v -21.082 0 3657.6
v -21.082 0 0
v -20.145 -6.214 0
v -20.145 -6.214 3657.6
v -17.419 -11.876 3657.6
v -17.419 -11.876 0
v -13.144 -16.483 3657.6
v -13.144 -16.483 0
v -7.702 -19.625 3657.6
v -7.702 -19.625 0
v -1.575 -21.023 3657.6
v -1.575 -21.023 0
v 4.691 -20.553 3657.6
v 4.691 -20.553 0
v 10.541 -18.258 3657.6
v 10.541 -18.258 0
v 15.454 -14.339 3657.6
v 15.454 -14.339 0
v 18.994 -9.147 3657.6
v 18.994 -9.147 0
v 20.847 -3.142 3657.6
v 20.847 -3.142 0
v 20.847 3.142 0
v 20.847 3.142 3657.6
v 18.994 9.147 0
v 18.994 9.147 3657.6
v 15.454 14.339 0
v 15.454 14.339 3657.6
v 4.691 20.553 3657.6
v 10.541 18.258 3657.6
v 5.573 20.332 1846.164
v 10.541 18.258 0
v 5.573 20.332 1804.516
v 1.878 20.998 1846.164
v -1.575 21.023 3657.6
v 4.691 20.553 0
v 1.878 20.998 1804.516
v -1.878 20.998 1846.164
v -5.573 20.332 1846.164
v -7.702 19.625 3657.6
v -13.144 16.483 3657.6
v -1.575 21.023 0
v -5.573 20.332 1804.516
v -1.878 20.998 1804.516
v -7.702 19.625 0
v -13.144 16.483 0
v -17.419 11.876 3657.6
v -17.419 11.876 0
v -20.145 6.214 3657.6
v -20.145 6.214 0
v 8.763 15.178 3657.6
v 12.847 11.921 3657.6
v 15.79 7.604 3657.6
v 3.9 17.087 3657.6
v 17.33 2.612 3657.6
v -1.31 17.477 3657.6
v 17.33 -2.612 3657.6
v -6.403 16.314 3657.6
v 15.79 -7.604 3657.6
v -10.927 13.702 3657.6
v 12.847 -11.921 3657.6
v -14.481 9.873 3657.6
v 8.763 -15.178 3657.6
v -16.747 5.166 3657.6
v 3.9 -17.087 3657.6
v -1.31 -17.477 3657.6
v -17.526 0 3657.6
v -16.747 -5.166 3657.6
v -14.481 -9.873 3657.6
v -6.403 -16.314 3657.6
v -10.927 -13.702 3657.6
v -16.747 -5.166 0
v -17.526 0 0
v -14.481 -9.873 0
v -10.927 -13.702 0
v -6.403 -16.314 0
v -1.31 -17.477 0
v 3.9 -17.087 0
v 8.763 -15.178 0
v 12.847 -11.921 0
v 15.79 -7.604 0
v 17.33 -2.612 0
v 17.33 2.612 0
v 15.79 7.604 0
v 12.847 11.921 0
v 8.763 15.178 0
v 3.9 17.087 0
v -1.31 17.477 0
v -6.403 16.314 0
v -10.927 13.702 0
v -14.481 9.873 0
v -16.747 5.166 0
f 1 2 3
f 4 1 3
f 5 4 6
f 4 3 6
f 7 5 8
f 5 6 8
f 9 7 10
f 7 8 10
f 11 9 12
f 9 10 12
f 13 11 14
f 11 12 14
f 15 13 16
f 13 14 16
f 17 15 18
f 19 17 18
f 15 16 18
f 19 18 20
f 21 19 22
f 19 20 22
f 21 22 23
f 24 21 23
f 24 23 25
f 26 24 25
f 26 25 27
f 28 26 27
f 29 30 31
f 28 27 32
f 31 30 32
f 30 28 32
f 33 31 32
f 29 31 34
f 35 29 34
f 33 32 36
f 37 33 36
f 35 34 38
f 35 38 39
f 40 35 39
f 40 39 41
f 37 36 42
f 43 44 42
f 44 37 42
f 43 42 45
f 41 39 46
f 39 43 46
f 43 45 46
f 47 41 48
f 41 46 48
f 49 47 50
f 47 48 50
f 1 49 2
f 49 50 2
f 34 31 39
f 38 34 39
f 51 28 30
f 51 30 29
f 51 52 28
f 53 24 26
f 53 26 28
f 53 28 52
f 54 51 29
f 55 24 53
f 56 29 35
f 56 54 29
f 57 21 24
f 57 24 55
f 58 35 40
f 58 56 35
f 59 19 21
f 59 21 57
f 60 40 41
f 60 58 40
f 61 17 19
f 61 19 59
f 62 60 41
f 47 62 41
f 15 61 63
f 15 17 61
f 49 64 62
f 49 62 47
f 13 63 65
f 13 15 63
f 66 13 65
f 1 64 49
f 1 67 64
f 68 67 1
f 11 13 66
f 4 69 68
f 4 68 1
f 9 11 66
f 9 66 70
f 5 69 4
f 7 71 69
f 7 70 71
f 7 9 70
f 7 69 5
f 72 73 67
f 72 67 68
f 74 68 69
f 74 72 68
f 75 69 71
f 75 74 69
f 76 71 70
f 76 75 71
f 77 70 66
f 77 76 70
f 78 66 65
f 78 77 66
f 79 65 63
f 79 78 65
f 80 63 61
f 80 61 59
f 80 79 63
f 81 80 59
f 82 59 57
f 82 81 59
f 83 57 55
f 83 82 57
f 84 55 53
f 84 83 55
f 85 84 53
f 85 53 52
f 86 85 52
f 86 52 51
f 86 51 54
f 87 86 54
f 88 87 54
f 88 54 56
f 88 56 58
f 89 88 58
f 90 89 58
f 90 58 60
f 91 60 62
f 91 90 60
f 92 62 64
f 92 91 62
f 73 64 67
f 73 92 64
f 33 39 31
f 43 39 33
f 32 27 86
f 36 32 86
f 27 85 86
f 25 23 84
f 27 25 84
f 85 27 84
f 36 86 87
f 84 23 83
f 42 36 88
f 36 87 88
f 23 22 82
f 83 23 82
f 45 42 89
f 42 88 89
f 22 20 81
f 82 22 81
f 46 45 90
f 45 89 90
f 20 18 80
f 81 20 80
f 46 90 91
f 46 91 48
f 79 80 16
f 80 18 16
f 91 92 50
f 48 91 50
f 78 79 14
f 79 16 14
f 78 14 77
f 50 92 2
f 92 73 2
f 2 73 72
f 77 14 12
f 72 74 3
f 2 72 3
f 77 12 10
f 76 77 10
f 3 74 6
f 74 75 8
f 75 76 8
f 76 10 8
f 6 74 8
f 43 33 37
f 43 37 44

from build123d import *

# Parameters (mm, degrees)
SKETCH1_R               = 21.082
SKETCH1_R_2             = 17.526
BOSS_EXTRUDE1_DEPTH     = 3657.6
CUT_EXTRUDE1_DEPTH      = 3658.721512287
CUT_EXTRUDE1_DEPTH_BACK = 3658.721512287
SKETCH4_W               = 41.647807864
SKETCH4_H               = 5.7730783


with BuildPart() as part:
    # Sketch1 → Boss-Extrude1 (new body)
    with BuildSketch(Plane.XY):
        with Locations(Location((0, 0, 0), (0, 0, 180))):
            Circle(SKETCH1_R)
        with Locations(Location((0, 0, 0), (0, 0, 180))):
            Circle(SKETCH1_R_2, mode=Mode.SUBTRACT)
    extrude(amount=BOSS_EXTRUDE1_DEPTH)

    # Sketch4 → Cut-Extrude1 (cut, two sides: drawn at the far end of the back side and taken through both)
    with BuildSketch(Plane(origin=(0, 0, 0), x_dir=(0, 0, -1), z_dir=(1, 0, 0)).offset(-CUT_EXTRUDE1_DEPTH_BACK)):
        with Locations((-1825.339738044, 23.218596963)):
            Rectangle(SKETCH4_W, SKETCH4_H)
    extrude(amount=CUT_EXTRUDE1_DEPTH + CUT_EXTRUDE1_DEPTH_BACK, mode=Mode.SUBTRACT)


solid = part.part
